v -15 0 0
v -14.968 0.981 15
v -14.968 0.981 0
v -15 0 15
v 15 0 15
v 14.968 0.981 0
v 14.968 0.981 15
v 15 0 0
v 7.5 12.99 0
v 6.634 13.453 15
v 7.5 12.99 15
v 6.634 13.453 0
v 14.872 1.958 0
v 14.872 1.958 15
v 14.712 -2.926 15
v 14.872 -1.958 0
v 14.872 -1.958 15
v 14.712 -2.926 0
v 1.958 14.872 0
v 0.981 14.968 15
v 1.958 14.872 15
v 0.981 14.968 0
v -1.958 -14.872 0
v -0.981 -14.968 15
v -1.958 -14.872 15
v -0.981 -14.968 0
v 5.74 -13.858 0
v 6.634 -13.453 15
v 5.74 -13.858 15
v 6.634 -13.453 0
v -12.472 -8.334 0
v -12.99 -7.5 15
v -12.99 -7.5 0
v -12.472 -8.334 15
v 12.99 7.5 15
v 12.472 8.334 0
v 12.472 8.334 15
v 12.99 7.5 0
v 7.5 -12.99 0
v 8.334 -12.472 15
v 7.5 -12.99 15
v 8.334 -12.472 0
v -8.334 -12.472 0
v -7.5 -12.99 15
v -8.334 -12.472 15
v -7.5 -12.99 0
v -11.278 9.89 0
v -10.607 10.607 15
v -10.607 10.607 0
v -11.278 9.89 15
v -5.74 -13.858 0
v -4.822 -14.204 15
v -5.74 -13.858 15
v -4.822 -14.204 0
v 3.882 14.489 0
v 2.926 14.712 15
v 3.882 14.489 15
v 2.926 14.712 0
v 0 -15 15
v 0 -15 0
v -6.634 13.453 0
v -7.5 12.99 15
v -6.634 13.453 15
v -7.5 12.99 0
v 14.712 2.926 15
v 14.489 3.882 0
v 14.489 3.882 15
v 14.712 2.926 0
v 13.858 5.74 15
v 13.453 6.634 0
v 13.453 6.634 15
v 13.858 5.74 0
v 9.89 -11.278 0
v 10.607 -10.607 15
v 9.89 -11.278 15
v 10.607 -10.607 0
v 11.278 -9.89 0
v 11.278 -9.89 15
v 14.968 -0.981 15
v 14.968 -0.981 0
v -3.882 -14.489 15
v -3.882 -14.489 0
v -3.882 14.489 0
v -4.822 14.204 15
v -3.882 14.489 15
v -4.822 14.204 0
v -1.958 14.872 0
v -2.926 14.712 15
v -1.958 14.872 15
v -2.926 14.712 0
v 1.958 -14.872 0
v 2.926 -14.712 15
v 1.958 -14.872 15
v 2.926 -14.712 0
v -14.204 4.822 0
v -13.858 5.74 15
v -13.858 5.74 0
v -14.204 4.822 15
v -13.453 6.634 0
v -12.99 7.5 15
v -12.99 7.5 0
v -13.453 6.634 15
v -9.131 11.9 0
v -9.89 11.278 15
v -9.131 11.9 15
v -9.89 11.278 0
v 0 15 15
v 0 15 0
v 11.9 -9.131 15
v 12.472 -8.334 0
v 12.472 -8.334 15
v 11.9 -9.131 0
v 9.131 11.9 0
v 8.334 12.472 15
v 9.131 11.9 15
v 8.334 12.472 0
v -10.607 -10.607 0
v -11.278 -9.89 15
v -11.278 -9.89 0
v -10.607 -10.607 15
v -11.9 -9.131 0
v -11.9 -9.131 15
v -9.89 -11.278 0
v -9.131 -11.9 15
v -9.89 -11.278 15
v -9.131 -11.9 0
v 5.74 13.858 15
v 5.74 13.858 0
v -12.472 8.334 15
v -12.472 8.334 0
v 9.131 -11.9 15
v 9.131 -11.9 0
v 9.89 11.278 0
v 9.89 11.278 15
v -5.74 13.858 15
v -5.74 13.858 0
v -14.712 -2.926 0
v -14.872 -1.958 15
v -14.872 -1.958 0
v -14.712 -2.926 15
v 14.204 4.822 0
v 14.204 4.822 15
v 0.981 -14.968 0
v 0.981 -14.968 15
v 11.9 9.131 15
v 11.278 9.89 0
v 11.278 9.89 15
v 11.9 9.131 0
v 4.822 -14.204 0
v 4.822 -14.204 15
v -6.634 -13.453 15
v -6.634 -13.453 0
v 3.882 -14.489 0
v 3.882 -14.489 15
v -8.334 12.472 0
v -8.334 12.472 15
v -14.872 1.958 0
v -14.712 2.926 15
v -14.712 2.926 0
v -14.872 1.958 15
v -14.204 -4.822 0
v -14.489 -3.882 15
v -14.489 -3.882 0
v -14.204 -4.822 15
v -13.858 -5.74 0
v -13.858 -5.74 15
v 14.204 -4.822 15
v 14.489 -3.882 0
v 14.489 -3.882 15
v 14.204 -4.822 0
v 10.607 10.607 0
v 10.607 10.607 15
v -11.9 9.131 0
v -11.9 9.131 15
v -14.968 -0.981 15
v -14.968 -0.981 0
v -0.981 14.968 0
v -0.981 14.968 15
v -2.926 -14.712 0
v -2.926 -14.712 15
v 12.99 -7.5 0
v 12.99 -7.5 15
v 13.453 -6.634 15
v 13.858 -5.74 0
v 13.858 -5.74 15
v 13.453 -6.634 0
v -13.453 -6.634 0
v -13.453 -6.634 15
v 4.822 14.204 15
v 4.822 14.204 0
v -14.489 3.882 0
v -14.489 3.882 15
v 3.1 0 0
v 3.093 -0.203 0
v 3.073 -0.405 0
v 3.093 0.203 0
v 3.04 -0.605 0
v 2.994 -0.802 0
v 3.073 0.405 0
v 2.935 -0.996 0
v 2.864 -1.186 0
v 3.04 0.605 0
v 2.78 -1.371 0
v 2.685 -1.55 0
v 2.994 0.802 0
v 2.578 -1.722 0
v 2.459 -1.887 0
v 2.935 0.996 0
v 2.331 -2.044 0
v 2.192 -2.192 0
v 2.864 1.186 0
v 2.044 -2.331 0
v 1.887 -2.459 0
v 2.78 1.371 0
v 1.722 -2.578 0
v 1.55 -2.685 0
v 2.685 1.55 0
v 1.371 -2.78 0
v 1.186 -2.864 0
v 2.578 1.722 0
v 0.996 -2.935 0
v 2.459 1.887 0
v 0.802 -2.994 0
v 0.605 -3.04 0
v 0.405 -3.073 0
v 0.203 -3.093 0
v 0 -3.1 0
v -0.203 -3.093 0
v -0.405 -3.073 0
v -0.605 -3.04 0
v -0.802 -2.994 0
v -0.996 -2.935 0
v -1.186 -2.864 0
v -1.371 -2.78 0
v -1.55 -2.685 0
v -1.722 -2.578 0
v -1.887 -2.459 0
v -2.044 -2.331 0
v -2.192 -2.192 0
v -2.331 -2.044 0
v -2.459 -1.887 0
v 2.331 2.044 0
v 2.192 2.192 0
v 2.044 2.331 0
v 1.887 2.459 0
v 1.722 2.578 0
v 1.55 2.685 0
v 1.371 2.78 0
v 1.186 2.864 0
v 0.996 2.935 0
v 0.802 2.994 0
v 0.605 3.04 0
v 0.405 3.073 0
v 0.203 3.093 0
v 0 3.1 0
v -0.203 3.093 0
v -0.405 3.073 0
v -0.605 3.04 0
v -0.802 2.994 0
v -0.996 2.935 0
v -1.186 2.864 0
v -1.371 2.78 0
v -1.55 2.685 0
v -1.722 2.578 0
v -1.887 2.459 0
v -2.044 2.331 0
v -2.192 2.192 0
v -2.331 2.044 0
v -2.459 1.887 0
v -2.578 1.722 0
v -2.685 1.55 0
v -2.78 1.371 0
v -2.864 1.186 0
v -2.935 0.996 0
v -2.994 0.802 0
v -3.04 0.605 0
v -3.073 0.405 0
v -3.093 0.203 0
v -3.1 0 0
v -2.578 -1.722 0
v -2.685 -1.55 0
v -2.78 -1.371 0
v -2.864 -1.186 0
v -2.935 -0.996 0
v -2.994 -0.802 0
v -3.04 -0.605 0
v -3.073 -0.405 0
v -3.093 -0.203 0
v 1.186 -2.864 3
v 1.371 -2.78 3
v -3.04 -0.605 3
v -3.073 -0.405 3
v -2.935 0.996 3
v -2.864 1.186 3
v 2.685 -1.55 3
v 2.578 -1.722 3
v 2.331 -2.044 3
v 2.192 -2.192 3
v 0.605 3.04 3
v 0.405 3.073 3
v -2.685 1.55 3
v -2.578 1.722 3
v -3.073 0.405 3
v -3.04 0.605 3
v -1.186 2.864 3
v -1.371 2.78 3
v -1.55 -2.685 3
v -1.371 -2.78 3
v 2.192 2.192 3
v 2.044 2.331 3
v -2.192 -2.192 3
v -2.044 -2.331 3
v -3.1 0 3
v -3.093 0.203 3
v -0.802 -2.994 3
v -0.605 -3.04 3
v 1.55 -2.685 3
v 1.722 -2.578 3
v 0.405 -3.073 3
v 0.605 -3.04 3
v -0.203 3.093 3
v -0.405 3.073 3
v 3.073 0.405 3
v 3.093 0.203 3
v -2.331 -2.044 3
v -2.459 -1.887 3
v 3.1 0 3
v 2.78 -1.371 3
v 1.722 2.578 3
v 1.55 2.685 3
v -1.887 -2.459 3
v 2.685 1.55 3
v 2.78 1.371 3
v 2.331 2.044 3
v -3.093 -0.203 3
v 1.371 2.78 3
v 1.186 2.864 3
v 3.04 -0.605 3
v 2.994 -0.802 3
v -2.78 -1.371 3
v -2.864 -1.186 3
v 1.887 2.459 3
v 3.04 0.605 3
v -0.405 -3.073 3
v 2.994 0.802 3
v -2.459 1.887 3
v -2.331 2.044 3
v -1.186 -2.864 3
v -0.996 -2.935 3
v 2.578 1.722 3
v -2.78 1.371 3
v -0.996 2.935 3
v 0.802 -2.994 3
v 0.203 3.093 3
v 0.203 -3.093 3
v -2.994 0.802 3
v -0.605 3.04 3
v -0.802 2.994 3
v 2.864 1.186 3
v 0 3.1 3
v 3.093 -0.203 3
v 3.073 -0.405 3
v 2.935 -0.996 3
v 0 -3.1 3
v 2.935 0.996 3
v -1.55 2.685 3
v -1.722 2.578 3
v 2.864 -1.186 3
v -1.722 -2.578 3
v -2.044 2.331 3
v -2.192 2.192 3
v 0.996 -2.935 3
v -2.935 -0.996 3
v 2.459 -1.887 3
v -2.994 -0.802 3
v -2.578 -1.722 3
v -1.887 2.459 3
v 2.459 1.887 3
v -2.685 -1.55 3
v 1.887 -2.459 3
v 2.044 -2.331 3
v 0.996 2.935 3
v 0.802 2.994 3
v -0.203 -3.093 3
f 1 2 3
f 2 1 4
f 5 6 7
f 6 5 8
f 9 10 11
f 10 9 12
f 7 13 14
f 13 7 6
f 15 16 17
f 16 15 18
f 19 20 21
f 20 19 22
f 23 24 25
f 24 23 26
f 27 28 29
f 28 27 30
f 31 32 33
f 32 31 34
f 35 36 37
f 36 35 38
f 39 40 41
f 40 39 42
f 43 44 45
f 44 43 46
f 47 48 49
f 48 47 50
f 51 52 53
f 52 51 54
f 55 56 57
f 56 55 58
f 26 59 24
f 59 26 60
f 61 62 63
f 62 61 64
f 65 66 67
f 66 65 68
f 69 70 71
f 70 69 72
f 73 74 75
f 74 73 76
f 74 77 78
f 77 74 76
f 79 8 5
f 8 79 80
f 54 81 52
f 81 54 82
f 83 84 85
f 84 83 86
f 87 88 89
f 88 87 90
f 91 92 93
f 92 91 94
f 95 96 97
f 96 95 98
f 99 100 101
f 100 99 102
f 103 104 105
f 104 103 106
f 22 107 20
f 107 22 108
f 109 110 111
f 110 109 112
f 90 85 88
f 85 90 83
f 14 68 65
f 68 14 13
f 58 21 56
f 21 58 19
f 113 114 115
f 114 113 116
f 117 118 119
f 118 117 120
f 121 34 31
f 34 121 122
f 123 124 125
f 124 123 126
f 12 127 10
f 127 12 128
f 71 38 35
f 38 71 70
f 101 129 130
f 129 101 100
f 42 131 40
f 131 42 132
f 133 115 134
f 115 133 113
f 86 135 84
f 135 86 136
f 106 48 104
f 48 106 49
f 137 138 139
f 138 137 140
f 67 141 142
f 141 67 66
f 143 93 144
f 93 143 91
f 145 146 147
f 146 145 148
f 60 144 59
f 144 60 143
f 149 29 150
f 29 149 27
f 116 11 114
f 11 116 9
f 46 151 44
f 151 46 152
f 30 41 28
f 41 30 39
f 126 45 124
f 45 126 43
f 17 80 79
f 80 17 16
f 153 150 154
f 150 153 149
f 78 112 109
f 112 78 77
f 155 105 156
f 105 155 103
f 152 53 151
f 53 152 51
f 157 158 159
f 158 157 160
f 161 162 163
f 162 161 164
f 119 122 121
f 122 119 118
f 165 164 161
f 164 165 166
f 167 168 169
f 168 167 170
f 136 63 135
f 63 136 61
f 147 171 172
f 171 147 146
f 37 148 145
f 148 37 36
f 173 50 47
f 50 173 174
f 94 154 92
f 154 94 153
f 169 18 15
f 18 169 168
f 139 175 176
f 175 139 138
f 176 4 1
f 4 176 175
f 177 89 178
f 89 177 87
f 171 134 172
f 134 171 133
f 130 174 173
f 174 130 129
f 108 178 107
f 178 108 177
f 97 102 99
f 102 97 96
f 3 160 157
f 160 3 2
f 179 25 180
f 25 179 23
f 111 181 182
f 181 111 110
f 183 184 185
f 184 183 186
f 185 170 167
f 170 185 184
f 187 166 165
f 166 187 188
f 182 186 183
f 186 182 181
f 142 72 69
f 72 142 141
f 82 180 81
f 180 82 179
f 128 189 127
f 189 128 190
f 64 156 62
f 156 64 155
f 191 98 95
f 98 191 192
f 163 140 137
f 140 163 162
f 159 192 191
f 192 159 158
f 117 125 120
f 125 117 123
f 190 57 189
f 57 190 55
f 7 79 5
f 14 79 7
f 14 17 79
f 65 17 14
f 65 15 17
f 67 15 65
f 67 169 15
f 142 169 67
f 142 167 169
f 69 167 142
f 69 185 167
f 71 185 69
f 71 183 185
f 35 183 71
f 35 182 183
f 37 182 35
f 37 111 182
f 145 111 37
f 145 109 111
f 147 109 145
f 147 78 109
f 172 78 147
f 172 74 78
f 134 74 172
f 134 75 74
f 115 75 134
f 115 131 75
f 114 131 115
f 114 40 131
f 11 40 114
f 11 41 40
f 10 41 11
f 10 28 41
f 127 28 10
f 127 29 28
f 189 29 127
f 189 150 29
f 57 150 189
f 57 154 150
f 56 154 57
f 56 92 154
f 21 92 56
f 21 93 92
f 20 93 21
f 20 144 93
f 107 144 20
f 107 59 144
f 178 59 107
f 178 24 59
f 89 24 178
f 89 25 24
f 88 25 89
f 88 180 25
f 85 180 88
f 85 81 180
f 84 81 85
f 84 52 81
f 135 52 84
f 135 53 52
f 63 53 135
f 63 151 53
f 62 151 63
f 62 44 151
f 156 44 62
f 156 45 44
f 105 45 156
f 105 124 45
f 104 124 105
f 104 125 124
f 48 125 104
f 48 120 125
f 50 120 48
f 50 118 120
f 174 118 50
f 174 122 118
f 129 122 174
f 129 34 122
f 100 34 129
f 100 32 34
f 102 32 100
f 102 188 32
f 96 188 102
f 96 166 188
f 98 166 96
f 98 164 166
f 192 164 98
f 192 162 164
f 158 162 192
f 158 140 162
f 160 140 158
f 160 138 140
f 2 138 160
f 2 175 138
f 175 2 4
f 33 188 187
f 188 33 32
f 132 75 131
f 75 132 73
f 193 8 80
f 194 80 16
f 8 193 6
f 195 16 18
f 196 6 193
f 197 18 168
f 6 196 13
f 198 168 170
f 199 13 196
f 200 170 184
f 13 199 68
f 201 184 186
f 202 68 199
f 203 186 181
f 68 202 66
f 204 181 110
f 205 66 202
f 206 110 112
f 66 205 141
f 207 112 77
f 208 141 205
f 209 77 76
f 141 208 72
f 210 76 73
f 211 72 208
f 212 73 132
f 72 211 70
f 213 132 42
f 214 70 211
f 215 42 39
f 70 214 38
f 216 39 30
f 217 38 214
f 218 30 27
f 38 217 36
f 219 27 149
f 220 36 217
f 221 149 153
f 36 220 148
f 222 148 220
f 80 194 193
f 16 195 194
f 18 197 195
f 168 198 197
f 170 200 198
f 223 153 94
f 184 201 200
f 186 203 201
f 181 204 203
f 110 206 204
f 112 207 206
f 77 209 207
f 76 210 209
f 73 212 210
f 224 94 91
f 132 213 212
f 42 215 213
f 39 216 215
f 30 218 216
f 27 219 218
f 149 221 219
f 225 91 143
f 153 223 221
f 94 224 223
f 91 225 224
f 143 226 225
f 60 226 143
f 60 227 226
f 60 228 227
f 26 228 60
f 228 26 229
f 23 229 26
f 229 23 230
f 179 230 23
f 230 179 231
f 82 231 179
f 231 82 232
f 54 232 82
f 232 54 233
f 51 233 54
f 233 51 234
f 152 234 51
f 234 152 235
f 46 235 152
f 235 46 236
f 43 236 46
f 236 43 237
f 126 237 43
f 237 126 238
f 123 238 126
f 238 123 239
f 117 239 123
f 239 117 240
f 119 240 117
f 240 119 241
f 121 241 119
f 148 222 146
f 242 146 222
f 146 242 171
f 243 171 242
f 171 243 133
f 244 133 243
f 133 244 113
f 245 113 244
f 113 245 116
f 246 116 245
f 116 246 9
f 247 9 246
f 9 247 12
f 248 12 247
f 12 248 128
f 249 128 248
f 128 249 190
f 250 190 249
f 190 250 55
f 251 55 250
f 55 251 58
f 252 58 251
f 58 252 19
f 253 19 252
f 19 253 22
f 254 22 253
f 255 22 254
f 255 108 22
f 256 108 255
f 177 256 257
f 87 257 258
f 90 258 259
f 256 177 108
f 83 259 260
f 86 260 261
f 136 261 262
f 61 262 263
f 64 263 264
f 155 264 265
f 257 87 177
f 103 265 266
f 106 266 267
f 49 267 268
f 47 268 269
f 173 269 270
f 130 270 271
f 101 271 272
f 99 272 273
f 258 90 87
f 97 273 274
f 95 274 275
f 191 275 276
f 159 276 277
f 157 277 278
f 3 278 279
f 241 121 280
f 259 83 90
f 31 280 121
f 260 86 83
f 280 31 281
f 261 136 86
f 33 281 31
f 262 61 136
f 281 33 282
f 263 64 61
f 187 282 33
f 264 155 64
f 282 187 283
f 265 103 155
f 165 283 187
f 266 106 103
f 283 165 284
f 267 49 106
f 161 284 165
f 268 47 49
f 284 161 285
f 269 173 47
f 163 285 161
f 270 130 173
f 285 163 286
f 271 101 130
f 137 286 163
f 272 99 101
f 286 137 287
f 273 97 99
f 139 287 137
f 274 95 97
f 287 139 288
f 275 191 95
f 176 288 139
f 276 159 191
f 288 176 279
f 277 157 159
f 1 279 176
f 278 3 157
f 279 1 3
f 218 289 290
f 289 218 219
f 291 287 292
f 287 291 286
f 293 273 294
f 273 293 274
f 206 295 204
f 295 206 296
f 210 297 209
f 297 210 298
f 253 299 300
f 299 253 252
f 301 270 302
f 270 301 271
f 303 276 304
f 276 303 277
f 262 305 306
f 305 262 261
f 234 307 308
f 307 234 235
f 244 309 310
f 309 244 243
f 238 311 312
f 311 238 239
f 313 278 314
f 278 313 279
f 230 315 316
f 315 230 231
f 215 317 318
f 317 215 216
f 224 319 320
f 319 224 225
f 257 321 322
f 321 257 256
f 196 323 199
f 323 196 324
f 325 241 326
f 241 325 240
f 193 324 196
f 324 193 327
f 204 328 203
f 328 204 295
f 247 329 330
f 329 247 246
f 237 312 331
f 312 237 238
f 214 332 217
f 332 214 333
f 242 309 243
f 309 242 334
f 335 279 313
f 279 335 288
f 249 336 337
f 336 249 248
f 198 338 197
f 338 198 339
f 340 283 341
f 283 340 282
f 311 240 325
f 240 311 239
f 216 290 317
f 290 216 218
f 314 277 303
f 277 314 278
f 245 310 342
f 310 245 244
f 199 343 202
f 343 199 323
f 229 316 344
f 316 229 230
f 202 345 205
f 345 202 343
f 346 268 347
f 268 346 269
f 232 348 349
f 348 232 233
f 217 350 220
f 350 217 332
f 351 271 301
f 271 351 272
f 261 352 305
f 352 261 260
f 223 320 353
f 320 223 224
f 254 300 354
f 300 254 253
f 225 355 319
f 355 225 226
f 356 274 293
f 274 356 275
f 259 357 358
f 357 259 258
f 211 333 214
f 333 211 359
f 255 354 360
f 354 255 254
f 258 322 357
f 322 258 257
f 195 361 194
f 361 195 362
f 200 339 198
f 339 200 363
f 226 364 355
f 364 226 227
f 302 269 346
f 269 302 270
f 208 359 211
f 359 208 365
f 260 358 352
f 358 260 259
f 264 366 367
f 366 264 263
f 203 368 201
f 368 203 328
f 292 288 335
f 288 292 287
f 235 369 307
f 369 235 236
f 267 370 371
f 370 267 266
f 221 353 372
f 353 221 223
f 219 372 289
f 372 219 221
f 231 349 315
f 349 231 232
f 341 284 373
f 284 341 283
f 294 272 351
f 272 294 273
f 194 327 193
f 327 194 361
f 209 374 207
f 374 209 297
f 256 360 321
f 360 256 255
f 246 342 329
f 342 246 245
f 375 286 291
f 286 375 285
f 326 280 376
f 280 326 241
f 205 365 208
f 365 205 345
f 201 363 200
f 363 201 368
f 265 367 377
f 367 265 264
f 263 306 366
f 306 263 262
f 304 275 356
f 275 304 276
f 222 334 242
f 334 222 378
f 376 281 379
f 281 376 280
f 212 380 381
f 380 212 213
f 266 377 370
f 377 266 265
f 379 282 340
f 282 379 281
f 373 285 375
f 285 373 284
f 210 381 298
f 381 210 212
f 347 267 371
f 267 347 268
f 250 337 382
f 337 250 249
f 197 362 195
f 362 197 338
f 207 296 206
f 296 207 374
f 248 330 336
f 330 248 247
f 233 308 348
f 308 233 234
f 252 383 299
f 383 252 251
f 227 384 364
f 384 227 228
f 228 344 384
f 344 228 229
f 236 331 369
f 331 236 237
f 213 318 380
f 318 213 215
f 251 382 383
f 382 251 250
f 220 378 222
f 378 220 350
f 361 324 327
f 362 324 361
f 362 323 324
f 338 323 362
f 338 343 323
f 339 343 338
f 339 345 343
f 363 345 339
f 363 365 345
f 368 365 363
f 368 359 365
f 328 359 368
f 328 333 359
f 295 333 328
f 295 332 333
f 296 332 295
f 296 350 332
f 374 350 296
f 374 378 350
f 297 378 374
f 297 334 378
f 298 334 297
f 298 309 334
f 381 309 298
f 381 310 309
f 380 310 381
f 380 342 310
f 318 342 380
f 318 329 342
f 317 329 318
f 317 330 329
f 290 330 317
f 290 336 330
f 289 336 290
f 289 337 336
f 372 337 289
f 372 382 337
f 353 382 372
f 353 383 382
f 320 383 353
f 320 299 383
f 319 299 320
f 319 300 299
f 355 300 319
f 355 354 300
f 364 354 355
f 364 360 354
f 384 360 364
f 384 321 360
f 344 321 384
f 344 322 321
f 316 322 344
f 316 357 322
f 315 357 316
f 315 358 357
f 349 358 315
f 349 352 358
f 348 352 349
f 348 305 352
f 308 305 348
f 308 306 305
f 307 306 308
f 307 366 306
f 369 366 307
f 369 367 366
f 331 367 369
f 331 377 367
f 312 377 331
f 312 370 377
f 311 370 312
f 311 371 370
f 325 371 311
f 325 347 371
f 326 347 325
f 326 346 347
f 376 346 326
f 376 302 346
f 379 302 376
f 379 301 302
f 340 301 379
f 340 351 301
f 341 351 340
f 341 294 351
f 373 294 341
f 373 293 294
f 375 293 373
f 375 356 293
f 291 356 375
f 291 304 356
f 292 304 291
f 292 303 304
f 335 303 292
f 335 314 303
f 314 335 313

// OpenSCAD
// Replacement knob for a hotplate stirrer - a cylinder with a D-shaped blind bore and a
// pointer groove, and with a ring of grip grooves around the outside. NOVEL general part.
//

bottom_d = 30;
height   = 15;
shaft_d  = 6.2;
flat     = 4.7;
grooves  = 18;
pointer  = 1.5;

$fn = 96;

difference() {
    cylinder(h = height, d = bottom_d);
    translate([0, 0, 0])
        cylinder(h = height - 12, d = shaft_d, $fn = 96);                 // round bore
    translate([0, 0, 0])
        cylinder(h = height - 12, d = shaft_d, $fn = 48);                 // flat bore
    for (i = [0 : grooves - 1])
        rotate([0, 90, i * 360 / grooves])
            translate([bottom_d / 2, 0, 0])
                cylinder(h = height, d = 2, $fn = 16);                    // grip grooves
    translate([0, 0, height - 1])
        circle(d = bottom_d);                                             // cap the top
    translate([0, 0, height - 1])
        difference() {
            circle(d = bottom_d);
            circle(d = bottom_d - 2 * pointer);
        }                                                                 // pointer groove
}
